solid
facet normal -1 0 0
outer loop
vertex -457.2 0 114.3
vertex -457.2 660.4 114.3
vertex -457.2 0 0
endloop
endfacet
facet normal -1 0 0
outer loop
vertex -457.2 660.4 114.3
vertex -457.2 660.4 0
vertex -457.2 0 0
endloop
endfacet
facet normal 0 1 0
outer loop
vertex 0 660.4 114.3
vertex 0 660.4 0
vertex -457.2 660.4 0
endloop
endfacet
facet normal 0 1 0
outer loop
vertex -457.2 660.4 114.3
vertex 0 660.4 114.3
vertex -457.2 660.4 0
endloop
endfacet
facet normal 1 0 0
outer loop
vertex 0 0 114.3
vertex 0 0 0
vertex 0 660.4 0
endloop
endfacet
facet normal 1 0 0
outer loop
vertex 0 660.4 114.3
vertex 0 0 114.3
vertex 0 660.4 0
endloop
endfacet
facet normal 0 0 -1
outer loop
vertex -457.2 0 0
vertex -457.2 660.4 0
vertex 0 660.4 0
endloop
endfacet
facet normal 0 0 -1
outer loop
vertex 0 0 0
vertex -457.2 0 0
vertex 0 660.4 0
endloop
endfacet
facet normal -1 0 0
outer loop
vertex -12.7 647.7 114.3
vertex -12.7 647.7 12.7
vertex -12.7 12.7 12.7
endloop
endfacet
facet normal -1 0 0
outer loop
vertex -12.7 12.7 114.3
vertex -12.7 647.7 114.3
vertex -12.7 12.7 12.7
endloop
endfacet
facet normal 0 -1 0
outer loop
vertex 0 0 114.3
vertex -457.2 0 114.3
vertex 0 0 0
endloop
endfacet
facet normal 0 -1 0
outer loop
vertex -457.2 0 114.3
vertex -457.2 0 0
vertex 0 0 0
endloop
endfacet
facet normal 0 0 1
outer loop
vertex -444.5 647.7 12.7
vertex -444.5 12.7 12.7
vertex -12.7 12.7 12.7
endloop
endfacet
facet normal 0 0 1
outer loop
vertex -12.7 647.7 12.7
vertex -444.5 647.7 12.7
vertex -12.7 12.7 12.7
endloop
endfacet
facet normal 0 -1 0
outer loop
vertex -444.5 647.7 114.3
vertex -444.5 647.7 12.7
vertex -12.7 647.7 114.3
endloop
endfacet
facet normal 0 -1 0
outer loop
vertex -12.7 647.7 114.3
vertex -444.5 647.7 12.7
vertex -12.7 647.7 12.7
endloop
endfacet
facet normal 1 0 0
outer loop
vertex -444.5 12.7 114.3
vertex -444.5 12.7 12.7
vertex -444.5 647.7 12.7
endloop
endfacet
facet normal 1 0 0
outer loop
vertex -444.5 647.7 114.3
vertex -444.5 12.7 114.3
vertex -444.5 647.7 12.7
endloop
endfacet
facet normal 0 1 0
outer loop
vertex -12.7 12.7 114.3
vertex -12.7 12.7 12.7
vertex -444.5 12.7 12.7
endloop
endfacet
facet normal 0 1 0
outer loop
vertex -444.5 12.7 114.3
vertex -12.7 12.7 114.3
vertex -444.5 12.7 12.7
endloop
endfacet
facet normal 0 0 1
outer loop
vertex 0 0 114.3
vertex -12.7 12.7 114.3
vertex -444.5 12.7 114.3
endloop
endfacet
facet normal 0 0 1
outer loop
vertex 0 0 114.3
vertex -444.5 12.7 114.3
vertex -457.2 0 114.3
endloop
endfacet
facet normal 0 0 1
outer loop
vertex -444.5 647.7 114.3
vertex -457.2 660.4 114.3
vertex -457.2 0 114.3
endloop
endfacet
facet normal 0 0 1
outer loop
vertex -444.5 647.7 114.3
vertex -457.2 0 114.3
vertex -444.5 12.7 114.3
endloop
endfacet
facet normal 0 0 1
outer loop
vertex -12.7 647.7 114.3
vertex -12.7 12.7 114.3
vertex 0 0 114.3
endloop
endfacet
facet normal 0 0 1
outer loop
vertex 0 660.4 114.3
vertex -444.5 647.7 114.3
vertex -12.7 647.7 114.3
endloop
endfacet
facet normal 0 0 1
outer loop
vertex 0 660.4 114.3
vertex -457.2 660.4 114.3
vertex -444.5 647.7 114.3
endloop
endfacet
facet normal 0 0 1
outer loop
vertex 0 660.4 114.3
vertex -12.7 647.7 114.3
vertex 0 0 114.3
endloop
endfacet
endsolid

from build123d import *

# Parameters (mm, degrees)
F0_W     = 457.2
F0_H     = 660.4
F1_DEPTH = 12.7
F3_DEPTH = 101.6


with BuildPart() as f1:
    # F0 (on Top) → F1 (new body)
    with BuildSketch(Plane.XY):
        with Locations((-228.6, 330.2)):
            Rectangle(F0_W, F0_H)
    extrude(amount=F1_DEPTH)

    # F2 (on face) → F3 (join)
    with BuildSketch(Plane.XY.offset(12.7)):
        Polygon((0, 12.7), (0, 660.4), (-12.7, 660.4), (-12.7, 647.7), (-12.7, 12.7), align=None)
        Polygon((-12.7, 647.7), (-12.7, 660.4), (-457.2, 660.4), (-457.2, 647.7), (-444.5, 647.7), align=None)
        Polygon((0, 0), (0, 12.7), (-12.7, 12.7), (-444.5, 12.7), (-444.5, 0), align=None)
        Polygon((-444.5, 12.7), (-444.5, 647.7), (-457.2, 647.7), (-457.2, 0), (-444.5, 0), align=None)
    extrude(amount=F3_DEPTH)


solid = f1.part
